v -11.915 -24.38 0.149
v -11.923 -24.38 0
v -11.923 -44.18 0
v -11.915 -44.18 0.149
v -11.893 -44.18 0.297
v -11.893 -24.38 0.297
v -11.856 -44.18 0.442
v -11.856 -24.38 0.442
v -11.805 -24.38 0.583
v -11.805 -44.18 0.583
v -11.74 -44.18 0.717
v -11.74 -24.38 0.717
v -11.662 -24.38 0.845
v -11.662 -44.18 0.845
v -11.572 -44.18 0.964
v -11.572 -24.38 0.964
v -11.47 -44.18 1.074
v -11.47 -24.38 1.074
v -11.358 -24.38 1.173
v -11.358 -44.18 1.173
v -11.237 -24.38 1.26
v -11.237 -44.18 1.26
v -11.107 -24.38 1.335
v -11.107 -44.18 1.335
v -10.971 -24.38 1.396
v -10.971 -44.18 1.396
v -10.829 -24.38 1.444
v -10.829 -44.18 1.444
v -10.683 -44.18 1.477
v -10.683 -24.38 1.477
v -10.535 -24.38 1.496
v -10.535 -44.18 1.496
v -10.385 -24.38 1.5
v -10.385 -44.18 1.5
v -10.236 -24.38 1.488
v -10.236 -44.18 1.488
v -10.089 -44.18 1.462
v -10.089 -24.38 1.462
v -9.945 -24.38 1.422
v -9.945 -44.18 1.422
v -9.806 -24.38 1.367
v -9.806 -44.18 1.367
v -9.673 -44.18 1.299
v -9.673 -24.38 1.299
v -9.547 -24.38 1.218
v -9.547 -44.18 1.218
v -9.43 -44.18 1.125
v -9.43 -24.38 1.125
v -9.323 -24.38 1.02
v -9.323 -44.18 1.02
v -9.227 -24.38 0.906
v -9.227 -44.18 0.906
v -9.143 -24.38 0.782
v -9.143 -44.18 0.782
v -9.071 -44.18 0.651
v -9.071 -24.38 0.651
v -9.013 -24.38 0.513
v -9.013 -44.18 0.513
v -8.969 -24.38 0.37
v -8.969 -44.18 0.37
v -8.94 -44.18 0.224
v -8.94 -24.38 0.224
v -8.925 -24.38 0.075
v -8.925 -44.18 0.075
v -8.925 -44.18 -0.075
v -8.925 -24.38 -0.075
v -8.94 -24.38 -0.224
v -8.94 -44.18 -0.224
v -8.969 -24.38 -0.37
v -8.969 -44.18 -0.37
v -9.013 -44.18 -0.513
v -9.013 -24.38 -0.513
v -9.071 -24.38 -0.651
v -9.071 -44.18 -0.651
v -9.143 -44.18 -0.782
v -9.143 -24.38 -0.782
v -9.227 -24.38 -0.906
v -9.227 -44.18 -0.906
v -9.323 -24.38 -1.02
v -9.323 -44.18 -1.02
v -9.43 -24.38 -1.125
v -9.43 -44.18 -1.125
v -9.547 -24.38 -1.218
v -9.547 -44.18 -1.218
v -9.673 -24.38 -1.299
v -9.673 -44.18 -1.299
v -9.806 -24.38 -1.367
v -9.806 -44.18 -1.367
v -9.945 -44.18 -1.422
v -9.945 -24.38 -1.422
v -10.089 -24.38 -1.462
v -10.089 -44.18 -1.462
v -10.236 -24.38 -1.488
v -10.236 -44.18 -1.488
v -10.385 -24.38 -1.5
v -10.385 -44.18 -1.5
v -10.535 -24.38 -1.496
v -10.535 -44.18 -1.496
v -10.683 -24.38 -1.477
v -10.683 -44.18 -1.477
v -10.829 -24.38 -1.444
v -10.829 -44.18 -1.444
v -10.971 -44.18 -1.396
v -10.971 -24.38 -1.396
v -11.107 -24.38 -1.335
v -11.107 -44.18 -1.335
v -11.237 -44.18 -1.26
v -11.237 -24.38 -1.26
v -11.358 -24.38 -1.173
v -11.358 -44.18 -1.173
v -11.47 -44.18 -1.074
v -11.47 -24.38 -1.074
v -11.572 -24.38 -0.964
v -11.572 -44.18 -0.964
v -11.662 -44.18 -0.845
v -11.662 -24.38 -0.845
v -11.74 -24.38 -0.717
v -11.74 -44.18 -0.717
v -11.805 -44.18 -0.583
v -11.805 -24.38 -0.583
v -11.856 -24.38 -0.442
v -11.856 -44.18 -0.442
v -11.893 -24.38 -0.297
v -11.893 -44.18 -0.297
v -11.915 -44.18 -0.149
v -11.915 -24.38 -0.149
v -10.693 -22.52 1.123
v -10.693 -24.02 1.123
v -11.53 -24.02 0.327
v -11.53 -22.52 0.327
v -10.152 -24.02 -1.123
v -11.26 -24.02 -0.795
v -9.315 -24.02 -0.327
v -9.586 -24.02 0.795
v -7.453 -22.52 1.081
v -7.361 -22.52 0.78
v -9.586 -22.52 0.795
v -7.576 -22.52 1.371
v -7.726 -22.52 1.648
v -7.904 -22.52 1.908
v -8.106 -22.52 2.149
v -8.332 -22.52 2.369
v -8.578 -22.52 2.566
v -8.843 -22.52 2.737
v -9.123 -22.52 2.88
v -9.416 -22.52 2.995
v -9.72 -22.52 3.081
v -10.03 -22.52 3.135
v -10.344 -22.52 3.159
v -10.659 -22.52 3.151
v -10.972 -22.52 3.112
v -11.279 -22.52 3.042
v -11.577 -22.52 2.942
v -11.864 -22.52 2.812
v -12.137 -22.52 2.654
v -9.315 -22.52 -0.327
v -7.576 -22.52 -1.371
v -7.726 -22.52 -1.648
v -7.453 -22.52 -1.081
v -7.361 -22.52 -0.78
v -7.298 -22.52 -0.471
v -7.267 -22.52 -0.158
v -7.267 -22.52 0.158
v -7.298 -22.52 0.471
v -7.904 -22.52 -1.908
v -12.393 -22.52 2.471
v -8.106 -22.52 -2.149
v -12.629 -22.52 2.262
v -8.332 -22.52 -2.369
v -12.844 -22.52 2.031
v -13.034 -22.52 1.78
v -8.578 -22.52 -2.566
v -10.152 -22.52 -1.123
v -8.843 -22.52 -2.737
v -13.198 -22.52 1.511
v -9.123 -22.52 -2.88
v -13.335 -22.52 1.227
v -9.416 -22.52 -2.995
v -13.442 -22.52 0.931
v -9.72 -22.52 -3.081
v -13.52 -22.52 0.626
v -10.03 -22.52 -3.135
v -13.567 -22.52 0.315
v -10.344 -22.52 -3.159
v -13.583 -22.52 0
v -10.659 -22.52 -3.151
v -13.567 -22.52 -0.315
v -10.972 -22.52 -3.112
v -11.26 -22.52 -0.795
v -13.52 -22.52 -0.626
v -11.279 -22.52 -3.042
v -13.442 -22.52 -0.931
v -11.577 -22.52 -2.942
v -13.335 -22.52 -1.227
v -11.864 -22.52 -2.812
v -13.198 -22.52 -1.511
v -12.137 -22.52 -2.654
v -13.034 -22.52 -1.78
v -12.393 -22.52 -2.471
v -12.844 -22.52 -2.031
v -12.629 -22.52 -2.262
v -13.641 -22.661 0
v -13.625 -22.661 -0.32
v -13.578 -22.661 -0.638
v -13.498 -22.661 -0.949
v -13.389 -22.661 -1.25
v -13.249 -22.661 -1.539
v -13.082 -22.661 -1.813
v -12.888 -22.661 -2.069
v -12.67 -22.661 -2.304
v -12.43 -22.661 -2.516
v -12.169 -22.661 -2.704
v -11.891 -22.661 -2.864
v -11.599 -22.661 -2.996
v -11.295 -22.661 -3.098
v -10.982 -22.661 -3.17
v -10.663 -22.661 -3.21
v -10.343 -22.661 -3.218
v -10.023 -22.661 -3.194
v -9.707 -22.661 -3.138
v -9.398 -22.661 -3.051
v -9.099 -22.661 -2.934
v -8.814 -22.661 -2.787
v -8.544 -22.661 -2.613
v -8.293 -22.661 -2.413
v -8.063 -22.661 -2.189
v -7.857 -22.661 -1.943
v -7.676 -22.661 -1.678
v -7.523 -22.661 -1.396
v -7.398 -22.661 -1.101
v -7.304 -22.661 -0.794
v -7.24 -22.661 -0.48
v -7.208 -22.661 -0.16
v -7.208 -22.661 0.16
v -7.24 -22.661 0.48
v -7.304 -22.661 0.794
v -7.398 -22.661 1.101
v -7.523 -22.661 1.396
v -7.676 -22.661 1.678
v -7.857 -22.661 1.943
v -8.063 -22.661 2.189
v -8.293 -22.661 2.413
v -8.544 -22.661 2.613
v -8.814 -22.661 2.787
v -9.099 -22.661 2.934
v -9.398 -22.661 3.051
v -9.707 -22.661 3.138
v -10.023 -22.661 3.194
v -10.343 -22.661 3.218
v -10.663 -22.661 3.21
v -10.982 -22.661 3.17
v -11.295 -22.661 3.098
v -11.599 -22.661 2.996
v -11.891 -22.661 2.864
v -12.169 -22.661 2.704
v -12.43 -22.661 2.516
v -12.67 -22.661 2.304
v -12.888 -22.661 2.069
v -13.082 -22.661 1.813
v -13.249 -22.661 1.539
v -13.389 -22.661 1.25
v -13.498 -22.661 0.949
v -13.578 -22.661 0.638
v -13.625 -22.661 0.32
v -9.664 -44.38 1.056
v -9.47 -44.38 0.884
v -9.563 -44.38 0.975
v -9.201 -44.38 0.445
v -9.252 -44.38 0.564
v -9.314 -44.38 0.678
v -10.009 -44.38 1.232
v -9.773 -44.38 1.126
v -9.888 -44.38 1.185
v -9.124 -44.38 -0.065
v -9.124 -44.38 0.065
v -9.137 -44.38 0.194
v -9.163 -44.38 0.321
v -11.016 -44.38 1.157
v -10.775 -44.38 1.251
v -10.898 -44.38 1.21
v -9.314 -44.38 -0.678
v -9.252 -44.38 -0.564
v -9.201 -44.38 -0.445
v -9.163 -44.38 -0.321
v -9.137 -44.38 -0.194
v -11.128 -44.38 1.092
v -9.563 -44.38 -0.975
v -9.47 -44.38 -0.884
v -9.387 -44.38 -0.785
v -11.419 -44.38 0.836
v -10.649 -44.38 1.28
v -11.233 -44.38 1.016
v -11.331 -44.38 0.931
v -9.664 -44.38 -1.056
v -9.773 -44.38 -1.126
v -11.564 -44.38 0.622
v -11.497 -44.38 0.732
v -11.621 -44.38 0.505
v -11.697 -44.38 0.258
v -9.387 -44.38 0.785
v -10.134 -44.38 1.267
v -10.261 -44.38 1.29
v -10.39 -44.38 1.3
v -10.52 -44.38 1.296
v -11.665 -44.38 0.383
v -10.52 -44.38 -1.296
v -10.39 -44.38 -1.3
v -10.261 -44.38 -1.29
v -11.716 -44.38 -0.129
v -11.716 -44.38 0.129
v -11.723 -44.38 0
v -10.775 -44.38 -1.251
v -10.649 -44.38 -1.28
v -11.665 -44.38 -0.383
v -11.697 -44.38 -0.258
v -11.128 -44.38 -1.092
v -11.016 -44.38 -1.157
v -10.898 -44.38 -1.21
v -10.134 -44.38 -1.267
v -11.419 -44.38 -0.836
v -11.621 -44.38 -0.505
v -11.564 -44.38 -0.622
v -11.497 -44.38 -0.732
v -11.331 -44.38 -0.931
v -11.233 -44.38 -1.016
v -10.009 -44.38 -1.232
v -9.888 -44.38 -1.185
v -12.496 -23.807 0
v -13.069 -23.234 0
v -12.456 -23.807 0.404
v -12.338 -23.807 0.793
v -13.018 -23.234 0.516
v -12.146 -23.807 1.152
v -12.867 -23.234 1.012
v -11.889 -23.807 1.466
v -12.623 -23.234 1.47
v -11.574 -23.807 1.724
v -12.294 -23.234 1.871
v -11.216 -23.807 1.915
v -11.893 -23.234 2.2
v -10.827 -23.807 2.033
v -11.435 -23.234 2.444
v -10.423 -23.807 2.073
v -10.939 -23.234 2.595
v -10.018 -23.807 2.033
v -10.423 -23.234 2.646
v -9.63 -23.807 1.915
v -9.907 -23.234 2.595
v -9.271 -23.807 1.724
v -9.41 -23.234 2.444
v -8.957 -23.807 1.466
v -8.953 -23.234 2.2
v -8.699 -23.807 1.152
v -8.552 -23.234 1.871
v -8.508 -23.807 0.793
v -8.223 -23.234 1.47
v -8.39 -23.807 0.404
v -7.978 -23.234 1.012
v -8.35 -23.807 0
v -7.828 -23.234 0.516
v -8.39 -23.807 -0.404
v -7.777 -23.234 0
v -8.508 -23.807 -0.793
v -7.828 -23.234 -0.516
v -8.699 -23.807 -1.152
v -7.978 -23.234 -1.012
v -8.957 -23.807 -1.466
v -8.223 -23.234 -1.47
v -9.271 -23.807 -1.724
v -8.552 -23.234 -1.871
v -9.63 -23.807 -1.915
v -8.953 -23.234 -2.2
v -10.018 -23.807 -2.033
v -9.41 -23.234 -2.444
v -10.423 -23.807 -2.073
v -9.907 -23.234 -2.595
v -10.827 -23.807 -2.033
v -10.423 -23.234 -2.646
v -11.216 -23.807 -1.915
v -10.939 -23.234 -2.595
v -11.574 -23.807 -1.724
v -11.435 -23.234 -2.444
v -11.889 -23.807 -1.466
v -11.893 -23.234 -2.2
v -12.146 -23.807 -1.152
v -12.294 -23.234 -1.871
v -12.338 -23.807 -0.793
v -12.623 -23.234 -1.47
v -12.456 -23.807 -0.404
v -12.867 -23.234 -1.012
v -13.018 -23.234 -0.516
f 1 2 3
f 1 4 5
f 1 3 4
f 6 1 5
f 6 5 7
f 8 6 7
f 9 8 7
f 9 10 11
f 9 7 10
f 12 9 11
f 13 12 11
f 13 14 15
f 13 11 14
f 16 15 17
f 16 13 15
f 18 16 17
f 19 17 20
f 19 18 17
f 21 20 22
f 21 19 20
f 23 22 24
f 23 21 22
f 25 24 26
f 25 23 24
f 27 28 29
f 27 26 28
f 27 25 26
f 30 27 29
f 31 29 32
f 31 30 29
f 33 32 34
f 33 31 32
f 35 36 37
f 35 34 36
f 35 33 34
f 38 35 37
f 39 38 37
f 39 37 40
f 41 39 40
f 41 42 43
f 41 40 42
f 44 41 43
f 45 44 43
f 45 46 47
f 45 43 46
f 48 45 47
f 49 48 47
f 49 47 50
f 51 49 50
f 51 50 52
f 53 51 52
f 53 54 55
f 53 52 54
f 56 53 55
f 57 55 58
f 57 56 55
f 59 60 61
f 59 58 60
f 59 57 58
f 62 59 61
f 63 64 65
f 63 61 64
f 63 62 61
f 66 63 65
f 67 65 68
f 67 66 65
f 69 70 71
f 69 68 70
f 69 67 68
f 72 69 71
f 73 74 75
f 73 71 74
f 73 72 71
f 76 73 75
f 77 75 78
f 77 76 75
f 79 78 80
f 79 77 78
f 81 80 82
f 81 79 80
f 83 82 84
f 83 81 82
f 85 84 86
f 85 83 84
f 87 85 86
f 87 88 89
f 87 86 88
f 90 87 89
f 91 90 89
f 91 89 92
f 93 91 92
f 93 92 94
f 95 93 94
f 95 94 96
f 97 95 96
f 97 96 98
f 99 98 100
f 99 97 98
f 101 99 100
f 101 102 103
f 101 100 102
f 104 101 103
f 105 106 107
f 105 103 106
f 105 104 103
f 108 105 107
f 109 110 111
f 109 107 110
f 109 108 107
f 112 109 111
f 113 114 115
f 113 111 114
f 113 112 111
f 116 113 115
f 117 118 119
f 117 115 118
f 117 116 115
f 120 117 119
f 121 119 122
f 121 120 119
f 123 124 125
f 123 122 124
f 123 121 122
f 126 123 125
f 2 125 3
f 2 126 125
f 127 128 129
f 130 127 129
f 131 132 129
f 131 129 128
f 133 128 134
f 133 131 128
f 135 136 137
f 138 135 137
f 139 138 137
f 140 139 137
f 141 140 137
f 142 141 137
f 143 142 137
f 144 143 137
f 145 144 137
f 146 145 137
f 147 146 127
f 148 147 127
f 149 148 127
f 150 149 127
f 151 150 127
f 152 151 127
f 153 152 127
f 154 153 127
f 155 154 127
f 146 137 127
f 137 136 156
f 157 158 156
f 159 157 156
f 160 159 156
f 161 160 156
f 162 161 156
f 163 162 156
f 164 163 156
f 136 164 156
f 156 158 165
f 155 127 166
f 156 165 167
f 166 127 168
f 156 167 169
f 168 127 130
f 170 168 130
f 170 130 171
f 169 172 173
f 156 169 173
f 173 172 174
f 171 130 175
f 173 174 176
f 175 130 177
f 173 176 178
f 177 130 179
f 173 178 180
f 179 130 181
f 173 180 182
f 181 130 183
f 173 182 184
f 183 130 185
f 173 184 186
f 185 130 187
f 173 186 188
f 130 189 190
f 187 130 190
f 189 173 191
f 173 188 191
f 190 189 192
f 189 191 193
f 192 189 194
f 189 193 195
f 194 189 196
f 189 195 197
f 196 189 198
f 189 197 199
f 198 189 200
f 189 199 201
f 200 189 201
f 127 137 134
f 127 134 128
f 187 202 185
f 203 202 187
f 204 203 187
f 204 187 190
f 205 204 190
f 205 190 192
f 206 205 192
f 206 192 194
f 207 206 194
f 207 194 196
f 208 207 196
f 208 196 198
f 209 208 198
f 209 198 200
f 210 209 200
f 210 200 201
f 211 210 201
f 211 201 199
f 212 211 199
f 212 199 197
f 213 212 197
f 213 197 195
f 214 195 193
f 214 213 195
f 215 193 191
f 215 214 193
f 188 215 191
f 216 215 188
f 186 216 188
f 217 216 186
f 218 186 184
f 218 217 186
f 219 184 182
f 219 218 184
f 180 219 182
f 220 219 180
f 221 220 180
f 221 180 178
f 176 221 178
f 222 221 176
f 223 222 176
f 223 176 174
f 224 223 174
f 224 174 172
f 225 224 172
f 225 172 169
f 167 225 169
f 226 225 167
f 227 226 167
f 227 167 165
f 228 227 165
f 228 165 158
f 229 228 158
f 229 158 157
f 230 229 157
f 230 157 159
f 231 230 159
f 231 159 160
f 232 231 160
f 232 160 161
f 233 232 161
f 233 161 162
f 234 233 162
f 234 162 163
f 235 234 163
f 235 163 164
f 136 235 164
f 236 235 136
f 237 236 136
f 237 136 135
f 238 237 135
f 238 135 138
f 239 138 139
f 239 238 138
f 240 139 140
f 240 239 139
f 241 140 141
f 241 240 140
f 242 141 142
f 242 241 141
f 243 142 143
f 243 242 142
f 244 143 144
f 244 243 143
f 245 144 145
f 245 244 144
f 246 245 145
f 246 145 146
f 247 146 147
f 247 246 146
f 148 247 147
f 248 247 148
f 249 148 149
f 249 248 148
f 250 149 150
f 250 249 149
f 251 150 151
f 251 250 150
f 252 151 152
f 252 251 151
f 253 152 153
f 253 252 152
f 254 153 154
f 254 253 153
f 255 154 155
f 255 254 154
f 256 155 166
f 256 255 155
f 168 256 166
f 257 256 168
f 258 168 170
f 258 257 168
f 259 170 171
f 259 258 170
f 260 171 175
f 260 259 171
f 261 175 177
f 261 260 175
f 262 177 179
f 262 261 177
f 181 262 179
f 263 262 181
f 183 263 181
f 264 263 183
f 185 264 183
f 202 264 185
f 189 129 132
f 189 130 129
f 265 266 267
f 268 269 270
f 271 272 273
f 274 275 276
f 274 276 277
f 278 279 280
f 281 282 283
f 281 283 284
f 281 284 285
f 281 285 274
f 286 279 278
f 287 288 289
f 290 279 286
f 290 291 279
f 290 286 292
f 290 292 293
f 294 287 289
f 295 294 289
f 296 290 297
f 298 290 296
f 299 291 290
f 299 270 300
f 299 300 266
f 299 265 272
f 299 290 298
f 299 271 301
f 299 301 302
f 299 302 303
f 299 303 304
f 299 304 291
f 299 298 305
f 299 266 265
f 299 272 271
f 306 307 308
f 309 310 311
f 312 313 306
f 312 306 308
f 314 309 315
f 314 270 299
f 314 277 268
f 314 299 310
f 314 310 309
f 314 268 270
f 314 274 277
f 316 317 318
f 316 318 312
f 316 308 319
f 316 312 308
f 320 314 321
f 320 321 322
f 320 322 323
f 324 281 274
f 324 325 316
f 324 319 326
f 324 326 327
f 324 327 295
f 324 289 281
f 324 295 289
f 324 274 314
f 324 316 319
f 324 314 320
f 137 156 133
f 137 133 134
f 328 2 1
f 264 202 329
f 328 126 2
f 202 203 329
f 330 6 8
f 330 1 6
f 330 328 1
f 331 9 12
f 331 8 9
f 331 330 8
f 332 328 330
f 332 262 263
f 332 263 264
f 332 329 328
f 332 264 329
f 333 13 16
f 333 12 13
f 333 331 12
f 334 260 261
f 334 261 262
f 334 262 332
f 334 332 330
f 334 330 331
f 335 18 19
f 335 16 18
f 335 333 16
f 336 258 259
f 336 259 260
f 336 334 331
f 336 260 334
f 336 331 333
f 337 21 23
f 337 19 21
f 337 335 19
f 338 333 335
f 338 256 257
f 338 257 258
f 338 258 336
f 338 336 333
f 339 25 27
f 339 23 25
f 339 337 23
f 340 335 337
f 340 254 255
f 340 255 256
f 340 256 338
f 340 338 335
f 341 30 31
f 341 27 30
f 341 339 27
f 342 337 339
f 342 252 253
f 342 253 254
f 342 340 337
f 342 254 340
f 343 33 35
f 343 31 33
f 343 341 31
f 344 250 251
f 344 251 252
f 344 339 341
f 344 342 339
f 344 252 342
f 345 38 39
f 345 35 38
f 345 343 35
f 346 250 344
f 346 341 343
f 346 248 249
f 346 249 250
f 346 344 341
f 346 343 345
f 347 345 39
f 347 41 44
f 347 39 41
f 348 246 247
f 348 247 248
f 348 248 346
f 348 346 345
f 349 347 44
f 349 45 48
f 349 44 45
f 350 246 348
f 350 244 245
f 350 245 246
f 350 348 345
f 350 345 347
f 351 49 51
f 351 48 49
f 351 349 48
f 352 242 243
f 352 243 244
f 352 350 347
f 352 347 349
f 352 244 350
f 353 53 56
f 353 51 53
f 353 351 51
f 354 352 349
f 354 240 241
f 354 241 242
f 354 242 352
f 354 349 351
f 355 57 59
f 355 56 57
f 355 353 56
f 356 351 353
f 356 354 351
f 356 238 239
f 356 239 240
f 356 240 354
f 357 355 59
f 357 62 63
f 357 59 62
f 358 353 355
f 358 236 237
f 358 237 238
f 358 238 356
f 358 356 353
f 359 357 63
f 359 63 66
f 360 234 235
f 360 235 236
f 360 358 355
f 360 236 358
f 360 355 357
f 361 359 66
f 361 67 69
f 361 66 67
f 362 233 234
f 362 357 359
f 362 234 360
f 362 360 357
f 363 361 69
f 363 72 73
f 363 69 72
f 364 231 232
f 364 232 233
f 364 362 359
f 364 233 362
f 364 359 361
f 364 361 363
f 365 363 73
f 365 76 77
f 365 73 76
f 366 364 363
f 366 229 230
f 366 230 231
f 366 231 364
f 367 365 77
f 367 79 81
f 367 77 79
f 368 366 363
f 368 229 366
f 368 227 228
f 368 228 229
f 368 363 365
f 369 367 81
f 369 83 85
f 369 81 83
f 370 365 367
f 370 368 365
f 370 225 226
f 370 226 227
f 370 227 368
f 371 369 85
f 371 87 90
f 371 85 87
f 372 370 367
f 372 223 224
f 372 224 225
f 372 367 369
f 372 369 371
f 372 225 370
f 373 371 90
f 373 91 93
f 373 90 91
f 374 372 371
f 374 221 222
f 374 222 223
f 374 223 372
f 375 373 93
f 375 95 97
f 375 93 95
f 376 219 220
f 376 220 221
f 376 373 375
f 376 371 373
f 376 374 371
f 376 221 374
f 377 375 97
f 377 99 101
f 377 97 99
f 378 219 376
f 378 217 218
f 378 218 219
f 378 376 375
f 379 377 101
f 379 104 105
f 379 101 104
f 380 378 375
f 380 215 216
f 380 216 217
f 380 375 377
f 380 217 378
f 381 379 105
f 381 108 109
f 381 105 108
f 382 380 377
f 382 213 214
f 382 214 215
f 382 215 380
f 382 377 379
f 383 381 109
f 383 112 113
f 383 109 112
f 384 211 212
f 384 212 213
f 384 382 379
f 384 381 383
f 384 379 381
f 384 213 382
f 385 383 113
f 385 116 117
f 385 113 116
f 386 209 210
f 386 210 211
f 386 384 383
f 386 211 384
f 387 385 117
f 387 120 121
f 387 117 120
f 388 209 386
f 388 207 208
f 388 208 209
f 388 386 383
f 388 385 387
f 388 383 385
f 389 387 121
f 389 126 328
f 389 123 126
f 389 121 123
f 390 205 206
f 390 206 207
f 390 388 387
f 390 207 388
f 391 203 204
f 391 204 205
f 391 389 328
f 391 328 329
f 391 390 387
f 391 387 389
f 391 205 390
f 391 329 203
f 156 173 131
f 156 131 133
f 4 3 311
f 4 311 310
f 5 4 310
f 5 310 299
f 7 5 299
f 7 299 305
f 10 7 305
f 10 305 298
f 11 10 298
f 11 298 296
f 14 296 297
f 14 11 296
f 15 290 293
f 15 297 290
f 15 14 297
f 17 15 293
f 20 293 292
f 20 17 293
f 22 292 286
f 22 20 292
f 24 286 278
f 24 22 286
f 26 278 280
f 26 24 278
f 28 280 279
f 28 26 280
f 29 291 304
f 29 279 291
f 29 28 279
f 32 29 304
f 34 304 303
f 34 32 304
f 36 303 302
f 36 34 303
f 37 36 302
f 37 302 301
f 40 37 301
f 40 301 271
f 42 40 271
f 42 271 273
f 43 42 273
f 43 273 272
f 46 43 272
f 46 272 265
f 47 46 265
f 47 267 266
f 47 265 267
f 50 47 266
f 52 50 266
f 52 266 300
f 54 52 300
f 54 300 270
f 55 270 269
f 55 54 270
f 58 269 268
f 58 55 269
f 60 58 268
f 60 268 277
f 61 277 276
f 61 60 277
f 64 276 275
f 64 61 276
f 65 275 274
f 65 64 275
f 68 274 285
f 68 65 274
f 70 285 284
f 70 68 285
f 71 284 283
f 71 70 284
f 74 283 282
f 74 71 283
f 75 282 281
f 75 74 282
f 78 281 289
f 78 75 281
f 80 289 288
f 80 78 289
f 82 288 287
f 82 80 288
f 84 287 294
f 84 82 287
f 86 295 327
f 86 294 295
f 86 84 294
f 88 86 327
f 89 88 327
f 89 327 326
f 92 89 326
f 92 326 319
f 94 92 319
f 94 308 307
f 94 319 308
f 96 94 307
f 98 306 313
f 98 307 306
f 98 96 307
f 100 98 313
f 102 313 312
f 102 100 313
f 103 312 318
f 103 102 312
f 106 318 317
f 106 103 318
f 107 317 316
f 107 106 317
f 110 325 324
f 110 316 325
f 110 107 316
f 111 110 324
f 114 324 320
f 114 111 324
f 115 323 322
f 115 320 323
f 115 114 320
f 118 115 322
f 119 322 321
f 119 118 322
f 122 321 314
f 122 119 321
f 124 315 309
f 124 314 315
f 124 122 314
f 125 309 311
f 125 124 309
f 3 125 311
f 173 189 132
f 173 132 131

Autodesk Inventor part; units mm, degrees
ref_plane "YZ Plane" through (0, 0, 0) normal (1, 0, 0) x (0, 1, 0)
ref_plane "XZ Plane" through (0, 0, 0) normal (0, 1, 0) x (-1, 0, 0)
ref_plane "XY Plane" through (0, 0, 0) normal (0, 0, 1) x (1, 0, 0)
sketch "Sketch1" plane through (0, 0, 0) normal (0, 0, 1) x (1, 0, 0)
  line L0 (-13.7828, -22.52) -> (-10.4228, -22.52)
  line L1 (-10.4228, -22.52) -> (-10.4228, -29.38)
  line L2 (-10.4228, -29.38) -> (-10.4228, -44.38)
  line L3 (-10.4228, -44.38) -> (-11.9228, -44.38)
  line L4 (-11.9228, -44.38) -> (-11.9228, -24.38)
  line L5 (-11.9228, -24.38) -> (-13.7828, -22.52)
  point P0 (0, 0)
  dimension "d3" = 1.5
  dimension "d15" = 1.86
  dimension "d16" = 3.36
  dimension "d23" = 20
  dimension "d24" = 21.86
revolve "Revolution1" add sketch "Sketch1" angle 360 about axis through (-10.4228, -29.38, 0) along (0, -1, 0)
chamfer "Chamfer2" distance 0.2 angle 45 1 edges at (-8.9228, -44.38, 0)
chamfer "Chaflán3" distance 0.2 angle 45 1 edges at (-7.0628, -22.52, 0)
sketch "Boceto2" plane through (-10.4228, -22.52, 0) normal (0, 1, 0) x (1, 0, 0)
  line L0 (-0.8371, 0.7954) -> (0.2703, 1.1226)
  line L1 (0.2703, 1.1226) -> (1.1074, 0.3272)
  line L2 (1.1074, 0.3272) -> (0.8371, -0.7954)
  line L3 (0.8371, -0.7954) -> (-0.2703, -1.1226)
  line L4 (-0.2703, -1.1226) -> (-1.1074, -0.3272)
  line L5 (-1.1074, -0.3272) -> (-0.8371, 0.7954)
  point P0 (10.4228, 0)
  point P1 (0, 0)
  dimension "d20" = 2
extrude "Extrusión1" cut sketch "Boceto2" against normal blind 1.5
thread "Thread2" size "M3x0.5" class "6g" standard "ISO Metric profile" length 98
properties part number "Tornillo Allen cabeza fresada M3x20mm"
